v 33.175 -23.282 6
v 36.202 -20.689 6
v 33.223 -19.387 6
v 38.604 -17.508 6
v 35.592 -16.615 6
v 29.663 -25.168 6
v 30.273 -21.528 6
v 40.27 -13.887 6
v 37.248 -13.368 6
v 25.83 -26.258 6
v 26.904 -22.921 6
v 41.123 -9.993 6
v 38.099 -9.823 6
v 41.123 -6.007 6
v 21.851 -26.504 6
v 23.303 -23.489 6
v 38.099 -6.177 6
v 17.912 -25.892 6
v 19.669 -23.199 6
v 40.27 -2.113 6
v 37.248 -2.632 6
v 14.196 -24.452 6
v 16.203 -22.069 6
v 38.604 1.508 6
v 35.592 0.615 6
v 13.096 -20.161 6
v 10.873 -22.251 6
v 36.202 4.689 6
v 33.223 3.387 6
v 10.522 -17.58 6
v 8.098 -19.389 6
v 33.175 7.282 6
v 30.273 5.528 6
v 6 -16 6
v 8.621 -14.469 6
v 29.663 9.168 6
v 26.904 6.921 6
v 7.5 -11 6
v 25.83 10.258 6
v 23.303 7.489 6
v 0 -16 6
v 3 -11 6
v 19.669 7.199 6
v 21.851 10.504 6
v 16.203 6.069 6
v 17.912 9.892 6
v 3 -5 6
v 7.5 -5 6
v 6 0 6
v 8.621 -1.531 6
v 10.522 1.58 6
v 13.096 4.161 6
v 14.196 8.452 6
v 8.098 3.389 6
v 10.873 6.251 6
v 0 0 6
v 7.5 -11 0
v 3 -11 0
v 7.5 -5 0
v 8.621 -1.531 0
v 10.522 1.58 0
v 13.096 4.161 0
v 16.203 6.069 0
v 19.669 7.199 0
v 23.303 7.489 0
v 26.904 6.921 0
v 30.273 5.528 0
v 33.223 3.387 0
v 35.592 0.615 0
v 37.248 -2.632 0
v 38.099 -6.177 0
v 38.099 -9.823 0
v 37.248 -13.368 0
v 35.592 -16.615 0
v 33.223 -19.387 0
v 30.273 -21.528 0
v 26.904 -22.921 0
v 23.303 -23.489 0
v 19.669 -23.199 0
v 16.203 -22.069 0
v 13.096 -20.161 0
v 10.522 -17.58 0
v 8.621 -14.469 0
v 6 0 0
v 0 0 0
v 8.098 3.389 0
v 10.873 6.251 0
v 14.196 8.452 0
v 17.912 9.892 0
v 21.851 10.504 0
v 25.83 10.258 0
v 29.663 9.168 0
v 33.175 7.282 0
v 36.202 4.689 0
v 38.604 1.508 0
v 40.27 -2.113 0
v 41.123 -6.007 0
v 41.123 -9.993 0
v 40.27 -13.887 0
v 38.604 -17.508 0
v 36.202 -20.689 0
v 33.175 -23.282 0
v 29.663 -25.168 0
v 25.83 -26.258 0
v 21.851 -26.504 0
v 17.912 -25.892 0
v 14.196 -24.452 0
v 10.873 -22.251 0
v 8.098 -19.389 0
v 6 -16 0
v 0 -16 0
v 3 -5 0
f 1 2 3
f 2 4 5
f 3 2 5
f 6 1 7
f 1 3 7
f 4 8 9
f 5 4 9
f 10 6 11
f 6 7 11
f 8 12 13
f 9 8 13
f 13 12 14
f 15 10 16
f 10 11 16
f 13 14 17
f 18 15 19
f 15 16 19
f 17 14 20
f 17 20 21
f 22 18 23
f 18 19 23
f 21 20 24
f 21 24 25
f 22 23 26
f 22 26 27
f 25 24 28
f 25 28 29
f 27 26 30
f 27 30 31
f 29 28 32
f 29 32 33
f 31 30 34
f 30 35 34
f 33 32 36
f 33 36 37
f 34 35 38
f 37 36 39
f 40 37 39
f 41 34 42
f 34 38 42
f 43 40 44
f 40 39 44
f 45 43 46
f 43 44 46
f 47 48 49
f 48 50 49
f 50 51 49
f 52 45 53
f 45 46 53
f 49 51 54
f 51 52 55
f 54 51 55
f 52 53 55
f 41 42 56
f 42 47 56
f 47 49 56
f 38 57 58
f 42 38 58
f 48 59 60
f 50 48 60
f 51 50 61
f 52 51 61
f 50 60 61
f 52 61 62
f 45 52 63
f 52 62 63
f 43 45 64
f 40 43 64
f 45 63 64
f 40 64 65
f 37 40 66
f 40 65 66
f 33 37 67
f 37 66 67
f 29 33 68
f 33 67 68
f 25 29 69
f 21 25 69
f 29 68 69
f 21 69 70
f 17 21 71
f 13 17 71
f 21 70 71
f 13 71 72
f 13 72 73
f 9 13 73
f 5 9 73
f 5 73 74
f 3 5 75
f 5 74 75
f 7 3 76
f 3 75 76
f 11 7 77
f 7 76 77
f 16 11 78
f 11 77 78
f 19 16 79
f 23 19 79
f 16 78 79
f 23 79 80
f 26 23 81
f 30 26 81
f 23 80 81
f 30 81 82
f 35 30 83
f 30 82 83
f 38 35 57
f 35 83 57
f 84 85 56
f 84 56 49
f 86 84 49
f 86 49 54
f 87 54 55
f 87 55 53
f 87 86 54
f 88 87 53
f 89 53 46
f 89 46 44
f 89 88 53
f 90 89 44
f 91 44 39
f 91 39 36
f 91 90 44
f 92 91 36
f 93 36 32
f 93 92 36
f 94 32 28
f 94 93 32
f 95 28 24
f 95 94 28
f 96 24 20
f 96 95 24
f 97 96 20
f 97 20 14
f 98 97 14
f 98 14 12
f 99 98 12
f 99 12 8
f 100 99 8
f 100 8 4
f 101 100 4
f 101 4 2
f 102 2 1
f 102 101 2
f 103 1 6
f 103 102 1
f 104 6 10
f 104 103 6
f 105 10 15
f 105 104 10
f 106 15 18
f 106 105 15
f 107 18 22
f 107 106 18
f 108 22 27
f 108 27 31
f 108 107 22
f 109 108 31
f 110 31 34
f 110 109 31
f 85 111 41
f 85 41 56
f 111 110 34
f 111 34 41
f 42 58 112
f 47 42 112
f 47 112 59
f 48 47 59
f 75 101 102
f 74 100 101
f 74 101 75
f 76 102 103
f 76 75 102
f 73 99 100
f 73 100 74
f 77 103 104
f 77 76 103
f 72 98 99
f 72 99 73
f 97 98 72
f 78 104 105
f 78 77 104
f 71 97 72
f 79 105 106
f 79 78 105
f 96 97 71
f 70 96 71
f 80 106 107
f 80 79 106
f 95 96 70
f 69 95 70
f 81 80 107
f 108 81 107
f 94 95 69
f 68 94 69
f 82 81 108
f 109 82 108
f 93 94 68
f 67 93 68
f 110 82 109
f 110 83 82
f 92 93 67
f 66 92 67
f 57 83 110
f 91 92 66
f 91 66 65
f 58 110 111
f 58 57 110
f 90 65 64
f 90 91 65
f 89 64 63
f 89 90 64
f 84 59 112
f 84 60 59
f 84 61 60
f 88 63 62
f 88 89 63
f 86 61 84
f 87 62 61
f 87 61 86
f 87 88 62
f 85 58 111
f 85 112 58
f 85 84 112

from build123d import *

# Parameters (mm, degrees)
BOSS_EXTRU_1_DEPTH = 6


with BuildPart() as part:
    # Esquisse1 → Boss.-Extru.1 (new body)
    with BuildSketch(Plane.XY):
        with BuildLine():
            Line((0, 0), (6, 0))
            ThreePointArc((6, 0), (41.230424323, -8), (6, -16))
            Line((6, -16), (0, -16))
            Line((0, -16), (0, 0))
        make_face()
        with BuildLine():
            Line((3, -5), (7.5, -5))
            ThreePointArc((7.5, -5), (38.206906326, -8), (7.5, -11))
            Line((7.5, -11), (3, -11))
            Line((3, -11), (3, -5))
        make_face(mode=Mode.SUBTRACT)
    extrude(amount=BOSS_EXTRU_1_DEPTH)


solid = part.part
